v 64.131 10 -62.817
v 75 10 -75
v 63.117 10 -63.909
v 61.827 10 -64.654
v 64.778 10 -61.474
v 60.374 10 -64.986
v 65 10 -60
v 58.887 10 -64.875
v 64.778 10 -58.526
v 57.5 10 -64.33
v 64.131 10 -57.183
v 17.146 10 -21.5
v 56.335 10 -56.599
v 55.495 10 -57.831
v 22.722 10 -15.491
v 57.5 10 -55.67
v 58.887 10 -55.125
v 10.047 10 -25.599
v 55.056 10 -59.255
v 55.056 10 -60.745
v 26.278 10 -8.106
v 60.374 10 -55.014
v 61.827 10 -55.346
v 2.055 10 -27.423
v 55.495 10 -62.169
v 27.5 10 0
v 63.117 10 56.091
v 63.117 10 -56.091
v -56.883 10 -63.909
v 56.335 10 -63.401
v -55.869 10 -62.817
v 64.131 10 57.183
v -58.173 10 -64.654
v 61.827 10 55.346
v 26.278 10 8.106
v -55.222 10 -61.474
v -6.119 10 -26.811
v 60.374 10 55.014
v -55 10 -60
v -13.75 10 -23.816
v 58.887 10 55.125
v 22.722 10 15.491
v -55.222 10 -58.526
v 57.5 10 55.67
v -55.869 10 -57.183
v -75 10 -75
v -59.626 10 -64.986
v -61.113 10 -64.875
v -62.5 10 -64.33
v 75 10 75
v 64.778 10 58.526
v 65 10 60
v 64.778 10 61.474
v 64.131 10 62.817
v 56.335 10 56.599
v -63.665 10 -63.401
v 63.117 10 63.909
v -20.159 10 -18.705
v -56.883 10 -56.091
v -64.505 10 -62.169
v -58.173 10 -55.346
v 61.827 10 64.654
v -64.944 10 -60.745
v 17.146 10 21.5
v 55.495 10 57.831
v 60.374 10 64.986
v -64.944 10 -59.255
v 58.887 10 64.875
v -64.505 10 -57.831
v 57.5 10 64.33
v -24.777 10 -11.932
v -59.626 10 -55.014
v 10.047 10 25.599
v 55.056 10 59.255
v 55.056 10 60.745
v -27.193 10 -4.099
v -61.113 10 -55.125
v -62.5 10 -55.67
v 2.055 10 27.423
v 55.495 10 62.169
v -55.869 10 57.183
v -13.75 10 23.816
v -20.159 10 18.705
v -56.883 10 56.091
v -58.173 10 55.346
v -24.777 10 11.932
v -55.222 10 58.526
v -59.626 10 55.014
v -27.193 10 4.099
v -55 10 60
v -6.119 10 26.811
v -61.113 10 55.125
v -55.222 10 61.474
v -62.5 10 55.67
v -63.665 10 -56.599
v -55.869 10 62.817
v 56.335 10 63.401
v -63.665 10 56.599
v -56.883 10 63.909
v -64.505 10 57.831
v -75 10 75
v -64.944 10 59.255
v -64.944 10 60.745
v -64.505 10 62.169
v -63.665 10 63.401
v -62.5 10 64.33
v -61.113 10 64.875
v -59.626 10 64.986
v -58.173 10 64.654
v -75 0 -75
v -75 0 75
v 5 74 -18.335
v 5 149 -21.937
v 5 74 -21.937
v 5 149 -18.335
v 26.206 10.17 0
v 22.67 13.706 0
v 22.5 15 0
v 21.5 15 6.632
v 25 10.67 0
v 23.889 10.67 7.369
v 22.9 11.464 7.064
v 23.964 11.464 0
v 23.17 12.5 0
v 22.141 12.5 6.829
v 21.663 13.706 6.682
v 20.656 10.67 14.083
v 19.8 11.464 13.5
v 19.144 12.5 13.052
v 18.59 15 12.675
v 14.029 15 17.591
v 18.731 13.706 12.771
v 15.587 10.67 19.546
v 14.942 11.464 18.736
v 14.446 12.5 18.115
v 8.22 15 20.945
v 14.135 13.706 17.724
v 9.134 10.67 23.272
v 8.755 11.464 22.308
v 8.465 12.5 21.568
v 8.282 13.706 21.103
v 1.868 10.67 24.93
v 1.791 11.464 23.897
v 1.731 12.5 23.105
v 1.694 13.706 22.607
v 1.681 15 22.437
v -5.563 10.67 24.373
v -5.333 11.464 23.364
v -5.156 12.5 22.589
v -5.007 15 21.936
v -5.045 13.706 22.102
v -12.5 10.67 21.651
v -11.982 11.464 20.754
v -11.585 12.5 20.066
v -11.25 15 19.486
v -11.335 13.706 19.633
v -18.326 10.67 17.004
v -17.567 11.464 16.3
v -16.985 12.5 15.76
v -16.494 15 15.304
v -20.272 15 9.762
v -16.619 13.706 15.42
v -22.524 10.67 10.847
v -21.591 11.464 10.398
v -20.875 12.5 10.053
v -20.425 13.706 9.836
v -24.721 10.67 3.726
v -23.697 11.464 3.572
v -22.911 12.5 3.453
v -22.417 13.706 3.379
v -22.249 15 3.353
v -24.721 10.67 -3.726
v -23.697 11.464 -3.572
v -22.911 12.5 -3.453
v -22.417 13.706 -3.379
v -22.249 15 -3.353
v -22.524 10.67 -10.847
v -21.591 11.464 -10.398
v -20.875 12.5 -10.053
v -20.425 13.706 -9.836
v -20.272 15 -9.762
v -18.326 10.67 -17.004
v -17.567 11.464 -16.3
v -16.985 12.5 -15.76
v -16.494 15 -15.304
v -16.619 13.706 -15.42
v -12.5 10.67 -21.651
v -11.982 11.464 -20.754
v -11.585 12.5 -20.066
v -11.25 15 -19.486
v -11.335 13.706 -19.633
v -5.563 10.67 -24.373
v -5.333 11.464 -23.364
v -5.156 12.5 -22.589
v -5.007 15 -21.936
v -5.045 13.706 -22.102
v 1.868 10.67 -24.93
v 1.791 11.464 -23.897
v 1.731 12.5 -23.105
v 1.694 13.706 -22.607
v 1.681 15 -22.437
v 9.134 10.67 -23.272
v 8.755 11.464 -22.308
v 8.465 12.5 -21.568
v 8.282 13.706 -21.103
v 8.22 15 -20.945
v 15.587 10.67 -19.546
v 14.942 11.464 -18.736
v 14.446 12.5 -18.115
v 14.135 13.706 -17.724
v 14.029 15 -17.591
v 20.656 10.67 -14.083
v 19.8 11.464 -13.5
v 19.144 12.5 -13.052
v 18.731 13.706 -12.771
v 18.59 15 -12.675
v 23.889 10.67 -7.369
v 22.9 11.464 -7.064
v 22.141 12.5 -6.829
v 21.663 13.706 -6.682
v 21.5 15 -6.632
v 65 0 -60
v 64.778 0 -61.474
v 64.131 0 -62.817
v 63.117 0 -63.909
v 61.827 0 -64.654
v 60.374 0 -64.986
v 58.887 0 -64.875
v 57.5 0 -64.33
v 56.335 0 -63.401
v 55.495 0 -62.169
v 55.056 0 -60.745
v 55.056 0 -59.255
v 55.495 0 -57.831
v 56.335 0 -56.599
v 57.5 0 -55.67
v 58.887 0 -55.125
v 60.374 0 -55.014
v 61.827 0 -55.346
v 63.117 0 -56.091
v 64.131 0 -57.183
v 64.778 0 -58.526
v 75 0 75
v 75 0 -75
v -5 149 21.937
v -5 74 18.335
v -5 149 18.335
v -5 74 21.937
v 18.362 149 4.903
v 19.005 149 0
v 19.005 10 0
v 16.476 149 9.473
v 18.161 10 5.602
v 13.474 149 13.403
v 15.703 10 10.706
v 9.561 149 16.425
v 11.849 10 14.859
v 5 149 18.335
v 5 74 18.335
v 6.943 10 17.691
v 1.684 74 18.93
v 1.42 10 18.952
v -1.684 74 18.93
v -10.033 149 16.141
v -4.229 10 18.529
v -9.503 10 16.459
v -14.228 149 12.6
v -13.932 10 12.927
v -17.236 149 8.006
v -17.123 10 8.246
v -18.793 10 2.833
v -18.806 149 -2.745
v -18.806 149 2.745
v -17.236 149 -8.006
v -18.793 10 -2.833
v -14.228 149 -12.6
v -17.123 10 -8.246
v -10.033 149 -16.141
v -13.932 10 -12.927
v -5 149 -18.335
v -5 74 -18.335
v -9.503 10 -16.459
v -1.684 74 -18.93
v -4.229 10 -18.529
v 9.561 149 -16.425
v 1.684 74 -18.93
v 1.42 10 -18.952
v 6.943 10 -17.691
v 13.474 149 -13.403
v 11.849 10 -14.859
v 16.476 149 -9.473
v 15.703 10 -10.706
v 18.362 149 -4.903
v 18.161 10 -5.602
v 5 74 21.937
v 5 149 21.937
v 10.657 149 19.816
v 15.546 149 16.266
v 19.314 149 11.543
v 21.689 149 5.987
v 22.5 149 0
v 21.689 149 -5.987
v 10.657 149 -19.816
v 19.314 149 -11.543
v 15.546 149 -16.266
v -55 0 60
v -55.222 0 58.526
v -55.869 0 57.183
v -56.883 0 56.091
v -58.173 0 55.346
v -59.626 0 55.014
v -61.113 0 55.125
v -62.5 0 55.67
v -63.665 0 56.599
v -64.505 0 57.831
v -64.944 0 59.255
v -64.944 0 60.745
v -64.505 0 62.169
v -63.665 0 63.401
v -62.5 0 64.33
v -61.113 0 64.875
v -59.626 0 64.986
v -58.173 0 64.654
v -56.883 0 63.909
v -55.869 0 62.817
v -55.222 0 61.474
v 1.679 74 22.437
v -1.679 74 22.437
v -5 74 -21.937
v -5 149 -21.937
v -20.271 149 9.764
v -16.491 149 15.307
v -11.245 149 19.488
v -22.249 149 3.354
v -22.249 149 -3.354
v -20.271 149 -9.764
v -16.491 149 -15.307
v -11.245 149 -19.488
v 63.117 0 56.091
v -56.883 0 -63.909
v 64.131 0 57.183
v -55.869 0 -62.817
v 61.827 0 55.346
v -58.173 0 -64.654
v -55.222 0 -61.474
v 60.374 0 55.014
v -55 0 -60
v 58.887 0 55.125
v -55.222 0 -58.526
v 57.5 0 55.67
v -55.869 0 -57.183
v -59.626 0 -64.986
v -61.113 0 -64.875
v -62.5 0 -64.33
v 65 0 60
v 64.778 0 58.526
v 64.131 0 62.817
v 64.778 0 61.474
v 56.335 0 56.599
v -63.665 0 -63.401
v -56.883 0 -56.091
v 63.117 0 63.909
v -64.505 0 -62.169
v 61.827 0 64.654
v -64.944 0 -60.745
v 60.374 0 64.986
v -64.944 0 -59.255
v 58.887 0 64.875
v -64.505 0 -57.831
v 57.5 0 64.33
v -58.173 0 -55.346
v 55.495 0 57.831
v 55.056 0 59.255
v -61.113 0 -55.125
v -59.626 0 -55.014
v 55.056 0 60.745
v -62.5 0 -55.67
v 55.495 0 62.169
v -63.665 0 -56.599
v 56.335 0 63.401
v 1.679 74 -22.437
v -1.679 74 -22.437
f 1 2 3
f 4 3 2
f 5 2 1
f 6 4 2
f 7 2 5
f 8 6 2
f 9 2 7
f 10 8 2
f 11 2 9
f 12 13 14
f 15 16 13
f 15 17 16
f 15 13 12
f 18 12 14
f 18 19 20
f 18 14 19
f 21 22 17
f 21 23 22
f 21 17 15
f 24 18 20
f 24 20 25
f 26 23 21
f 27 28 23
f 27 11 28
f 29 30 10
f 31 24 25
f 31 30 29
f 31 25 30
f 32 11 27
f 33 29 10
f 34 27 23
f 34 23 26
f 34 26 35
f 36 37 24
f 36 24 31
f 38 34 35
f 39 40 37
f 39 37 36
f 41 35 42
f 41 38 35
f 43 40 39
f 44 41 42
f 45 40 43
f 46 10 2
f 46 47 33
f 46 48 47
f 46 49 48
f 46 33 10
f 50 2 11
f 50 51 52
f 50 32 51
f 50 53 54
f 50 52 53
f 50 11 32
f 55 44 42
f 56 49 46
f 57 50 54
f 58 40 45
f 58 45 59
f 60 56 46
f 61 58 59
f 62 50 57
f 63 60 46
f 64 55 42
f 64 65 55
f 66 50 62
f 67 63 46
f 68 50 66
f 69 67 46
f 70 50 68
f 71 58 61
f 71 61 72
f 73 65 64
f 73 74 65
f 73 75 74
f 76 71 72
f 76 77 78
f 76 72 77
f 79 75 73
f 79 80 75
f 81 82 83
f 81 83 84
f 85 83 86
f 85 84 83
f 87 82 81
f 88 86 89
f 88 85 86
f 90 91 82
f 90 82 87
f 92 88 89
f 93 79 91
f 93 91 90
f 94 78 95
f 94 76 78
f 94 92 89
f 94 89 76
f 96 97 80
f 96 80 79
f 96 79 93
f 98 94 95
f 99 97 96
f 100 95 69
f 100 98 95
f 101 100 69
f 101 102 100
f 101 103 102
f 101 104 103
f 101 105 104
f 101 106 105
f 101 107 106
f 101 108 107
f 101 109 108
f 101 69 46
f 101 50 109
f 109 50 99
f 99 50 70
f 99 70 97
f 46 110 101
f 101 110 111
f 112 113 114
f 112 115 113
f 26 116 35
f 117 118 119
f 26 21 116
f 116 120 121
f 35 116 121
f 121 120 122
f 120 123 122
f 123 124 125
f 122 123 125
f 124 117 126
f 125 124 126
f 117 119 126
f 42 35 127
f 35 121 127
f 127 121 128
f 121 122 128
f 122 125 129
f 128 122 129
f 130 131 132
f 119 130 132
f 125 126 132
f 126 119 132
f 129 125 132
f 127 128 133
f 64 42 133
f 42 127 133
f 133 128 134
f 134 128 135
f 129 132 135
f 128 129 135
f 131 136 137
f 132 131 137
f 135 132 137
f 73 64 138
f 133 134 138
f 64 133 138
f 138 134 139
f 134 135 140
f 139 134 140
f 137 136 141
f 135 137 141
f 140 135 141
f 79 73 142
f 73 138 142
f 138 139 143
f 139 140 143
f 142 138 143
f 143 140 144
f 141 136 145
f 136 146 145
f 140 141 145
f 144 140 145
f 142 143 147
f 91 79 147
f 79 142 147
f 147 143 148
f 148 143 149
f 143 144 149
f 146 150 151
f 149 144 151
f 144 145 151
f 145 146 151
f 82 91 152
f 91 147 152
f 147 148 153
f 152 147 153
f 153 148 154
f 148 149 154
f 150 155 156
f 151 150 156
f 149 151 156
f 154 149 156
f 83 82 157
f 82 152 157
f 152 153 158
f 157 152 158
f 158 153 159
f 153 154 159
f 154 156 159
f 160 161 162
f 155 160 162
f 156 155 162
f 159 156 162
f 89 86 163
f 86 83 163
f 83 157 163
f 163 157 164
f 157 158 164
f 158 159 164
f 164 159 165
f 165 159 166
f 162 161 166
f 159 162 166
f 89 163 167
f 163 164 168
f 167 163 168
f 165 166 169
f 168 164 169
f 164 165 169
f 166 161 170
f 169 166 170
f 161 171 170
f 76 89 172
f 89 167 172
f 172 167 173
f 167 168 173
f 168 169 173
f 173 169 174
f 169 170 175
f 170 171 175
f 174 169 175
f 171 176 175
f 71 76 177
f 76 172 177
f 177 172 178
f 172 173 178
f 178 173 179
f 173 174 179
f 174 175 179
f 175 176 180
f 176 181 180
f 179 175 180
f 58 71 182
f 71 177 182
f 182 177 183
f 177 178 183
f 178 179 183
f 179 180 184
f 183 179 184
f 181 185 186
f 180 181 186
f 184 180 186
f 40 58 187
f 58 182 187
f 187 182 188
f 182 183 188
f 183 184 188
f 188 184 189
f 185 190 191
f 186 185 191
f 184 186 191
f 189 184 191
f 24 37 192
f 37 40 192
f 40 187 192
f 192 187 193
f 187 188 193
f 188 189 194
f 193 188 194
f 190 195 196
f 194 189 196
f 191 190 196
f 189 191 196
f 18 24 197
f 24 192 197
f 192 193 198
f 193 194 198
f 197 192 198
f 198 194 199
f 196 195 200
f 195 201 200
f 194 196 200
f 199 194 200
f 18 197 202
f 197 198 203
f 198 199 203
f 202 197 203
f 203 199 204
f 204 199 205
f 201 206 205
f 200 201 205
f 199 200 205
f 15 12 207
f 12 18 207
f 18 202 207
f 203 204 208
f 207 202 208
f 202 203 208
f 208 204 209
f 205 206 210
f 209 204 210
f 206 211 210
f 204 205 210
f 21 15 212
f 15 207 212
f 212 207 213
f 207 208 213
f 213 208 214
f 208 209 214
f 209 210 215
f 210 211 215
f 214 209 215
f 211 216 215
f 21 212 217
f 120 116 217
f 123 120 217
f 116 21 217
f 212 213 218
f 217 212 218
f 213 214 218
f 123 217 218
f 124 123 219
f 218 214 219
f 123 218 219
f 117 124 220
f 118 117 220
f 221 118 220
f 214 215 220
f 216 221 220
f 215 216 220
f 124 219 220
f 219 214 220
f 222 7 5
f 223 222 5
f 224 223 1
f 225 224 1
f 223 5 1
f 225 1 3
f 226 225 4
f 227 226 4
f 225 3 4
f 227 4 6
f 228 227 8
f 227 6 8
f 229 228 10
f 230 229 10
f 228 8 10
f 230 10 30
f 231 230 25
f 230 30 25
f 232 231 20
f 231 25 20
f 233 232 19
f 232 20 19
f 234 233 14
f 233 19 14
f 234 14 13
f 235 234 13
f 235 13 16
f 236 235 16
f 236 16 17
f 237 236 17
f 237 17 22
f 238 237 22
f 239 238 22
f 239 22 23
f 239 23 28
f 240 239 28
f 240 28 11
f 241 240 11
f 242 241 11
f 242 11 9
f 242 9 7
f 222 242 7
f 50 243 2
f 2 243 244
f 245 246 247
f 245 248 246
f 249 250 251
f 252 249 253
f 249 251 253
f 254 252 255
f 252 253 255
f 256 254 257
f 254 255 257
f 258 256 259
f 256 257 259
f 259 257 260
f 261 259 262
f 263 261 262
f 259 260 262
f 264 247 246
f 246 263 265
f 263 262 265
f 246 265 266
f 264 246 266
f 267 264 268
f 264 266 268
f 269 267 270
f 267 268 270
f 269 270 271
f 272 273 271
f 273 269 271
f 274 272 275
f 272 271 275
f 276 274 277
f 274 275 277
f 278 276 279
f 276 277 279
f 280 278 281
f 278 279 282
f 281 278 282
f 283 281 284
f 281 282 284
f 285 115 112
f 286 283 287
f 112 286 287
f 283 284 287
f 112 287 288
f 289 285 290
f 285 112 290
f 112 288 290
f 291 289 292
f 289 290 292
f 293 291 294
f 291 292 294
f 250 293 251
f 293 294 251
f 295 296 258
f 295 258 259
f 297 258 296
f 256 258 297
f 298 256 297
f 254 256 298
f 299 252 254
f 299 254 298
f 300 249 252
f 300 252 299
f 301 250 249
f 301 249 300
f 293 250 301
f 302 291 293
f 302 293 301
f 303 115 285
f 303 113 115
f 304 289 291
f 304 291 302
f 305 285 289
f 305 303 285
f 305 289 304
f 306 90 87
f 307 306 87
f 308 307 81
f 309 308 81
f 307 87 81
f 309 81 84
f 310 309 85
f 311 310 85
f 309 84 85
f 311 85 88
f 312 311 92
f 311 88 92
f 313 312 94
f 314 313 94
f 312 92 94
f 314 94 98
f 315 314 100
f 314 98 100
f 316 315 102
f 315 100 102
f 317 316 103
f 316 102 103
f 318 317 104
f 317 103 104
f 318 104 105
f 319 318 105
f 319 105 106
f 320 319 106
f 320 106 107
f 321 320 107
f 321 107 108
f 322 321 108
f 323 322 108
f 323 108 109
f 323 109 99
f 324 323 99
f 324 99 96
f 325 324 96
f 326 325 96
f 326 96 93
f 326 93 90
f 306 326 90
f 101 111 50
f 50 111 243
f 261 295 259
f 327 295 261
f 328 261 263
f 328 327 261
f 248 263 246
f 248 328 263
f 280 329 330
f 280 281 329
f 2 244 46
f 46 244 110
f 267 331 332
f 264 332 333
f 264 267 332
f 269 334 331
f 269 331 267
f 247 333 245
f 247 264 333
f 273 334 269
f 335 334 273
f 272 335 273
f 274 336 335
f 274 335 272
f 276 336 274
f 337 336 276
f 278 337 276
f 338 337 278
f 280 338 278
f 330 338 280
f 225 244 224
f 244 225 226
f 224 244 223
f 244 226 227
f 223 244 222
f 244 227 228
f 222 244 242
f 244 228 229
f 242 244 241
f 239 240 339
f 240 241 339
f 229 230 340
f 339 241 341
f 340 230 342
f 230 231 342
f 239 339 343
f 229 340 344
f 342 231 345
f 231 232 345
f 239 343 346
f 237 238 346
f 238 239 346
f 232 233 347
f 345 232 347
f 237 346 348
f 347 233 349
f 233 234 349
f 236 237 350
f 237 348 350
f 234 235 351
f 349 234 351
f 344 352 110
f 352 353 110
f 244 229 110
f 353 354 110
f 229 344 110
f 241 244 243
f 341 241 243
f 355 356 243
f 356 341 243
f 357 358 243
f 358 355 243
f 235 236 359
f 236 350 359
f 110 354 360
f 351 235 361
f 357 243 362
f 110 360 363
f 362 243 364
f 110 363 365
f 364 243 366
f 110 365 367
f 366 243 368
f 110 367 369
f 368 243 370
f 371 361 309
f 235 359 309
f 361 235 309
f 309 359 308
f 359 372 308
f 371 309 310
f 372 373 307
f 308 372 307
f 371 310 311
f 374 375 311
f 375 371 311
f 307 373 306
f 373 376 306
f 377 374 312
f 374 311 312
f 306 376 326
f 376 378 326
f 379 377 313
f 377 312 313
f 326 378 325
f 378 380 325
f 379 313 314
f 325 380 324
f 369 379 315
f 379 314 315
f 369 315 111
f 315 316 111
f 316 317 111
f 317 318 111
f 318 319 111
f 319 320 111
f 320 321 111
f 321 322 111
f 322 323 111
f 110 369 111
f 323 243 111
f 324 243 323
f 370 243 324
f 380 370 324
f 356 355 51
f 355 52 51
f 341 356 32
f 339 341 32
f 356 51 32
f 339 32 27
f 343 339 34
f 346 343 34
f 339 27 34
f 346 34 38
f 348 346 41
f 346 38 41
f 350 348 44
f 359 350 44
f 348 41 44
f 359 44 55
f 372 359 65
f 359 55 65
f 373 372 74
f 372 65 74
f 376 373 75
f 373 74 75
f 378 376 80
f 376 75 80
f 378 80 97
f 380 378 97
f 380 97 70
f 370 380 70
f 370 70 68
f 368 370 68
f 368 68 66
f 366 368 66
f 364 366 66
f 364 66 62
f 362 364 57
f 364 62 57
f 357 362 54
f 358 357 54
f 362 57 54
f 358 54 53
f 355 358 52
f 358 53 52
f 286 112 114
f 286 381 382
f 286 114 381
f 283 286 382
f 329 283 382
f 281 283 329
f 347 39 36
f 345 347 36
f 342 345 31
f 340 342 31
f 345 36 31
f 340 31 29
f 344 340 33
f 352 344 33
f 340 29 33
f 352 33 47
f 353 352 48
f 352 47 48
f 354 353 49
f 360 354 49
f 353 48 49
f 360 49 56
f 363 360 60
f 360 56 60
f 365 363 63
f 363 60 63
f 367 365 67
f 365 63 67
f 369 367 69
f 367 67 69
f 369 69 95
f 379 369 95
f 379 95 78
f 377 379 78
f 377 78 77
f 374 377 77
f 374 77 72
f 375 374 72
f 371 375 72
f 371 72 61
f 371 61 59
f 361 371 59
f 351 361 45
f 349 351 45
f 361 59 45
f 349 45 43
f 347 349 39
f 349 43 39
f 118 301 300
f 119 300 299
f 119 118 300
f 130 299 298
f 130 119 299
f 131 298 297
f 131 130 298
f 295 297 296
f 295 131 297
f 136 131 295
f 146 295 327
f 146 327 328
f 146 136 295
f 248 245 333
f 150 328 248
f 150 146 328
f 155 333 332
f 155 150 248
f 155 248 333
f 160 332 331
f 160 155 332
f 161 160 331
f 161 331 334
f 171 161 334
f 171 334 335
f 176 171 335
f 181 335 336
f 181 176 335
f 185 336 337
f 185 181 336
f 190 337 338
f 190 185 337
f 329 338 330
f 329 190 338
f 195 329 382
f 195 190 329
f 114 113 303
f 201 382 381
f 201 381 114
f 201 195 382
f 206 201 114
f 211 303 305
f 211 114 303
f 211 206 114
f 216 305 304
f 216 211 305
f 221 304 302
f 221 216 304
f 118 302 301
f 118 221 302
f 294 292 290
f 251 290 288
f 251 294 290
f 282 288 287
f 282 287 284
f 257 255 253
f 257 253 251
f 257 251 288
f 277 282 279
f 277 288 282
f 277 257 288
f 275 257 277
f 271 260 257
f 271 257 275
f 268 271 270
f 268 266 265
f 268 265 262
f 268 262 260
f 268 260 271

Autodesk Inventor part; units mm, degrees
ref_plane "YZ Plane" through (0, 0, 0) normal (1, 0, 0) x (0, 1, 0)
ref_plane "XZ Plane" through (0, 0, 0) normal (0, 1, 0) x (-1, 0, 0)
sketch "Sketch1" plane through (0, 0, 0) normal (0, 1, 0) x (-1, 0, 0)
  line L0 (75, 75) -> (-75, 75)
  line L1 (-75, 75) -> (-75, -75)
  line L2 (-75, -75) -> (75, -75)
  line L3 (75, -75) -> (75, 75)
  line L4 (75, 75) -> (-75, -75) construction
  line L5 (-75, 75) -> (75, -75) construction
  point P0 (0, 0)
  dimension "d6" = 150
  dimension "d7" = 150
extrude "Extrusion4" add sketch "Sketch1" along normal blind 10
sketch "Sketch4" plane through (0, 10, 0) normal (0, 1, 0) x (1, 0, 0)
  line L0 (75, 75) -> (-75, 75) projected
  line L1 (0, 0) -> (-75, 75) construction
  circle A0 centre (-60, 60) radius 5
  line L2 (-75, 75) -> (-75, -75) projected
  line L3 (0, 75) -> (0, -75) construction
  line L4 (-75, -75) -> (75, -75) projected
  line L5 (-75, 0) -> (75, 0) construction
  circle A1 centre (60, 60) radius 5
  circle A2 centre (-60, -60) radius 5
  circle A3 centre (60, -60) radius 5
  dimension "d10" = 10
  dimension "d11" = 15
  dimension "d12" = 15
extrude "Extrusion5" cut sketch "Sketch4" against normal through all
sketch "Sketch5" plane through (0, 10, 0) normal (0, 1, 0) x (1, 0, 0)
  circle A0 centre (0, 0) radius 22.5
  circle A1 centre (0, 0) radius 19.005
  dimension "d15" = 45
  dimension "d18" = 38.01
extrude "Extrusion6" add sketch "Sketch5" along normal blind 139
fillet "Fillet1" radius 5 1 edges at (-22.5, 10, 0)
ref_plane "Work Plane1" through (0, 10, 22.5) normal (0, 0, 1) x (1, 0, 0)
sketch "Sketch6" plane through (0, 10, 22.5) normal (0, 0, 1) x (1, 0, 0)
  line L0 (-5, 214) -> (5, 214)
  line L1 (5, 214) -> (5, 64)
  line L2 (5, 64) -> (-5, 64)
  line L3 (-5, 64) -> (-5, 214)
  line L4 (-19.005, 139) -> (19.005, 139) projected
  line L5 (-5, 214) -> (5, 64) construction
  line L6 (5, 214) -> (-5, 64) construction
  point P0 (0, -10)
  point P1 (0, 139)
  point P2 (5, 139)
  point P3 (-5, 139)
  dimension "d20" = 10
  dimension "d21" = 150
extrude "Extrusion7" cut sketch "Sketch6" against normal through all contours L4 L1 L2 L3
properties part number "Motor_beam_connection"
